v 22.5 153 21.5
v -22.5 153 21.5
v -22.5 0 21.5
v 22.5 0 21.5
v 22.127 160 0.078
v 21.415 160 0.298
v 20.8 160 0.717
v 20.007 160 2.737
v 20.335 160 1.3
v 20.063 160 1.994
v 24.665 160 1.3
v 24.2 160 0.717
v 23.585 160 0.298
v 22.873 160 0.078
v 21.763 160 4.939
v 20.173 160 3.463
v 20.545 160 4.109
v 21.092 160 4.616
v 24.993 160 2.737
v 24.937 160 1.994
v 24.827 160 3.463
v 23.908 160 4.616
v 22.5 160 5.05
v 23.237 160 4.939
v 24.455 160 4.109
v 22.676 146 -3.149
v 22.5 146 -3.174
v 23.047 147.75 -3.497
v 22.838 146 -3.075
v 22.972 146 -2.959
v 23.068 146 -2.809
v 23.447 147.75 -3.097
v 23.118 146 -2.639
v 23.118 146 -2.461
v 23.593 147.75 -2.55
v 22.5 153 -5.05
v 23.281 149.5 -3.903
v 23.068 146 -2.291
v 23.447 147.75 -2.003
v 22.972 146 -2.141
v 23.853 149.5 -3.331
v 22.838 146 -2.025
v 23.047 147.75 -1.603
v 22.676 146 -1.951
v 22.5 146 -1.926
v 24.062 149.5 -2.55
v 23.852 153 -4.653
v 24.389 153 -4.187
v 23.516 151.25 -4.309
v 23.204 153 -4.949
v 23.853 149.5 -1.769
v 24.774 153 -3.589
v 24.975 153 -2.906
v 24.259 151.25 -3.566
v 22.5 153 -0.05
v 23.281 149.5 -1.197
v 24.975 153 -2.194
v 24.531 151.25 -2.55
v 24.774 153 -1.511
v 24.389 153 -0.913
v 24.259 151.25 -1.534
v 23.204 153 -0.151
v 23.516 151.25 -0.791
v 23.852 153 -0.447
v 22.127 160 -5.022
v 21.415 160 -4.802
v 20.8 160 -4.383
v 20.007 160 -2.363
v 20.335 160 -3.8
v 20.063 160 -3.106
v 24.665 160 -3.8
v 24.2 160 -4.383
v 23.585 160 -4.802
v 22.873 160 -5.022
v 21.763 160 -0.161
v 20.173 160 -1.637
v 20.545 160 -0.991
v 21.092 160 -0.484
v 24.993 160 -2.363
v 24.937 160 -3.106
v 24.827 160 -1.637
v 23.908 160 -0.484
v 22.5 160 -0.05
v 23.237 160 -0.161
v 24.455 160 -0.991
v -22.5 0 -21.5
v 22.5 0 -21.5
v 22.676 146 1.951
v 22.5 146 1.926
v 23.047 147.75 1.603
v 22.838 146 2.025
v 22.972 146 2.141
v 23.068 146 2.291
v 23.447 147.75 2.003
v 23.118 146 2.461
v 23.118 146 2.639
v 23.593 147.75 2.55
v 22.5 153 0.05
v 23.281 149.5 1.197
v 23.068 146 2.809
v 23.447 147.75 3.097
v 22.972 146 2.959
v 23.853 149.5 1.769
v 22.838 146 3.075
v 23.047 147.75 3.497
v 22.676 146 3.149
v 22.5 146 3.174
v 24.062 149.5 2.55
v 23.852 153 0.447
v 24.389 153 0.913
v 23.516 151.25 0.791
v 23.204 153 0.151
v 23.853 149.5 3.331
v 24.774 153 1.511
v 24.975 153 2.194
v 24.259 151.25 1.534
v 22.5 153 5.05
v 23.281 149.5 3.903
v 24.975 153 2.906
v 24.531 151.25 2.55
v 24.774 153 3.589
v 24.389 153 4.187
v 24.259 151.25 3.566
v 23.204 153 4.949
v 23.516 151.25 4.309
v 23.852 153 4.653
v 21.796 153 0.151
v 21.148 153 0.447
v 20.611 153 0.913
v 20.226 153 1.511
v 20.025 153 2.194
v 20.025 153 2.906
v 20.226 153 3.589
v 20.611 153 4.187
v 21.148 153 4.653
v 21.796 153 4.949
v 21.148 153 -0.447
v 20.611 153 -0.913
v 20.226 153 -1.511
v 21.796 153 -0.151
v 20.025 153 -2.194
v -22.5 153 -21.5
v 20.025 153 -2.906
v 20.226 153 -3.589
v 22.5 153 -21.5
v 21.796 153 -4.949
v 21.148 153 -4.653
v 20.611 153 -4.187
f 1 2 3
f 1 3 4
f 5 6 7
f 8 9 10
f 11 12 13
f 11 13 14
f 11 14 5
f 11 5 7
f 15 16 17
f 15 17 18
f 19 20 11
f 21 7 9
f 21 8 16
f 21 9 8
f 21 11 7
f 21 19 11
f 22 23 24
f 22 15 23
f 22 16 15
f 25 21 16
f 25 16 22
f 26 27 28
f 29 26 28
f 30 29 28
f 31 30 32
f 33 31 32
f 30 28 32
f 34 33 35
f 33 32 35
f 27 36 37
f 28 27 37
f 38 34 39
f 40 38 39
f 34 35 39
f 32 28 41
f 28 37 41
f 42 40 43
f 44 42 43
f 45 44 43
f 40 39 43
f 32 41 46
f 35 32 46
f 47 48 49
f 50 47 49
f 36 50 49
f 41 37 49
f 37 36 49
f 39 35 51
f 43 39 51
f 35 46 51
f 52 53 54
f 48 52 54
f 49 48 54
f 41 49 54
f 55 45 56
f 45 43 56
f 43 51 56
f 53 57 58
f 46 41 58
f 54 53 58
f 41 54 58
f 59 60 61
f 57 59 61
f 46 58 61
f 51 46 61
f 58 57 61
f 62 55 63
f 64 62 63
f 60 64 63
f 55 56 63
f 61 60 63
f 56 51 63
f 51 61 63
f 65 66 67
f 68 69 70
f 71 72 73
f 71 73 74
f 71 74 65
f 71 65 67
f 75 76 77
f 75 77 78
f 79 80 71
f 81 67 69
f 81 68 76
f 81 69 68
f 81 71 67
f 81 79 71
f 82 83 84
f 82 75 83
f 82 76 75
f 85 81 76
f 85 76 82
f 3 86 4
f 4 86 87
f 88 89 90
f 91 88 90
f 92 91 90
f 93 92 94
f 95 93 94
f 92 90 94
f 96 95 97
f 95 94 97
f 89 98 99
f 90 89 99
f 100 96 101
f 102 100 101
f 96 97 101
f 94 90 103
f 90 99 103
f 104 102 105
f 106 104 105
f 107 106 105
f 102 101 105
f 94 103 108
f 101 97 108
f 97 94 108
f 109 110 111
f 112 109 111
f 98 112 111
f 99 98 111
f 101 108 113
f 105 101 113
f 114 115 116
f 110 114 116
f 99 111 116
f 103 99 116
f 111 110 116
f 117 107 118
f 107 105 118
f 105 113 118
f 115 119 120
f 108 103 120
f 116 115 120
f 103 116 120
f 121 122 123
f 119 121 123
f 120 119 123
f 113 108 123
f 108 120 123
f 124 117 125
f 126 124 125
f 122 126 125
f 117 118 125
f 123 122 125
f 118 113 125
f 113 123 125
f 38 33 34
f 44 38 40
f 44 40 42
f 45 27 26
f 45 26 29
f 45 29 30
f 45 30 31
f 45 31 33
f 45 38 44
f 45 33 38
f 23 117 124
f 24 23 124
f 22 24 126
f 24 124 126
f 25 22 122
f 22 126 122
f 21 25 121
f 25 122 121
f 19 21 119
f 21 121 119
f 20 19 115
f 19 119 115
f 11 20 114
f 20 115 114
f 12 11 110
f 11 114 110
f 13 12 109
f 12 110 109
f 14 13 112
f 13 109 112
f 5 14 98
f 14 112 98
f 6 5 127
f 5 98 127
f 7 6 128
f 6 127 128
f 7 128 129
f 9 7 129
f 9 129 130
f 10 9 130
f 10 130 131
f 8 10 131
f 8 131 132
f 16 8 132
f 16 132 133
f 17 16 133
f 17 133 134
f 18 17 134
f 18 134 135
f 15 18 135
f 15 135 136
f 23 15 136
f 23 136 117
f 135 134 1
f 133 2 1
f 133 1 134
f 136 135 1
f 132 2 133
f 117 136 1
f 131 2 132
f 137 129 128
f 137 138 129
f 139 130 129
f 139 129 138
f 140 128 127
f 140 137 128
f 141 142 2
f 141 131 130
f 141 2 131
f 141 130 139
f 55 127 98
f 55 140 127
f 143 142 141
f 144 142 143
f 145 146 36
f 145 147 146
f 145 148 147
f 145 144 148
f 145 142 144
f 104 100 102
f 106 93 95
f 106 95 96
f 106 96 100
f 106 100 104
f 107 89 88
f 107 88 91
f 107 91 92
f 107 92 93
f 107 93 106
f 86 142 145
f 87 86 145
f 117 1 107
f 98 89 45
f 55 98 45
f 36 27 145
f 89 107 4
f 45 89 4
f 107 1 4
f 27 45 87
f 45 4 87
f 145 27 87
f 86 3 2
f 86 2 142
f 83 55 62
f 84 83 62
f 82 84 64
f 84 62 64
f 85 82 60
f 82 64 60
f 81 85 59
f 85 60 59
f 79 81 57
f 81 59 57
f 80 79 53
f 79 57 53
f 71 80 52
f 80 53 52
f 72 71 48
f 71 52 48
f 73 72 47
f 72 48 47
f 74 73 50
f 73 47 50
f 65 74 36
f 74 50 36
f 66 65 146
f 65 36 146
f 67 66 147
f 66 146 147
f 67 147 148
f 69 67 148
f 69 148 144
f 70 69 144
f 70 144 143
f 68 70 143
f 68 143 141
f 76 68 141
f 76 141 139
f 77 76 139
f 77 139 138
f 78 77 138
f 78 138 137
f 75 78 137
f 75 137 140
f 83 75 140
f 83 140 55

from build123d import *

# Parameters (mm, degrees)
SKETCH1_W                     = 45
SKETCH1_H                     = 43
BOSS_EXTRUDE1_DEPTH           = 153
SKETCH2_R                     = 2.5
BOSS_EXTRUDE4_DEPTH           = 7
SKETCH3_R                     = 2.5
BOSS_EXTRUDE5_DEPTH           = 7
BOSS_EXTRUDE5_DRAFT           = 15
BOSS_EXTRUDE5_PROFILE_2_DEPTH = 7
BOSS_EXTRUDE5_PROFILE_2_DRAFT = 15


with BuildPart() as part:
    # Sketch1 → Boss-Extrude1 (new body)
    with BuildSketch(Plane(origin=(0, 0, 0), x_dir=(1, 0, 0), z_dir=(0, 1, 0))):
        Rectangle(SKETCH1_W, SKETCH1_H)
    extrude(amount=BOSS_EXTRUDE1_DEPTH)

    # Sketch2 → Boss-Extrude4 (add)
    with BuildSketch(Plane(origin=(0, 153, 0), x_dir=(1, 0, 0), z_dir=(0, 1, 0))):
        with Locations(Location((22.5, -2.55, 0), (0, 0, 270))):
            Circle(SKETCH2_R)
        with Locations(Location((22.5, 2.55, 0), (0, 0, 270))):
            Circle(SKETCH2_R)
    extrude(amount=BOSS_EXTRUDE4_DEPTH)


with BuildPart() as boss_extrude5_tool:
    # Sketch3 → Boss-Extrude5 (with draft: the straight prism first)
    with BuildSketch(Plane.XZ.offset(-153)):
        with Locations(Location((22.5, 2.55, 0), (0, 0, 90))):
            Circle(SKETCH3_R)
    extrude(amount=BOSS_EXTRUDE5_DEPTH)
    # Boss-Extrude5: the draft: its side faces are tilted about the plane it starts from
    boss_extrude5_sides = [boss_extrude5_tool.faces().sort_by_distance(p)[0] for p in [
        (22.5, 149.5, 0.05),
    ]]
    draft(boss_extrude5_sides, Plane.XZ.offset(-153), BOSS_EXTRUDE5_DRAFT)


with BuildPart() as part_1:
    add(part.part)

    # Boss-Extrude5: add boss_extrude5_tool
    add(boss_extrude5_tool.part)


with BuildPart() as boss_extrude5_profile_2_tool:
    # Sketch3 → Boss-Extrude5 profile 2 (with draft: the straight prism first)
    with BuildSketch(Plane.XZ.offset(-153)):
        with Locations(Location((22.5, -2.55, 0), (0, 0, 90))):
            Circle(SKETCH3_R)
    extrude(amount=BOSS_EXTRUDE5_PROFILE_2_DEPTH)
    # Boss-Extrude5 profile 2: the draft: its side faces are tilted about the plane it starts from
    boss_extrude5_profile_2_sides = [boss_extrude5_profile_2_tool.faces().sort_by_distance(p)[0] for p in [
        (22.5, 149.5, -5.05),
    ]]
    draft(boss_extrude5_profile_2_sides, Plane.XZ.offset(-153), BOSS_EXTRUDE5_PROFILE_2_DRAFT)


with BuildPart() as part_2:
    add(part_1.part)

    # Boss-Extrude5 profile 2: add boss_extrude5_profile_2_tool
    add(boss_extrude5_profile_2_tool.part)


solid = part_2.part
